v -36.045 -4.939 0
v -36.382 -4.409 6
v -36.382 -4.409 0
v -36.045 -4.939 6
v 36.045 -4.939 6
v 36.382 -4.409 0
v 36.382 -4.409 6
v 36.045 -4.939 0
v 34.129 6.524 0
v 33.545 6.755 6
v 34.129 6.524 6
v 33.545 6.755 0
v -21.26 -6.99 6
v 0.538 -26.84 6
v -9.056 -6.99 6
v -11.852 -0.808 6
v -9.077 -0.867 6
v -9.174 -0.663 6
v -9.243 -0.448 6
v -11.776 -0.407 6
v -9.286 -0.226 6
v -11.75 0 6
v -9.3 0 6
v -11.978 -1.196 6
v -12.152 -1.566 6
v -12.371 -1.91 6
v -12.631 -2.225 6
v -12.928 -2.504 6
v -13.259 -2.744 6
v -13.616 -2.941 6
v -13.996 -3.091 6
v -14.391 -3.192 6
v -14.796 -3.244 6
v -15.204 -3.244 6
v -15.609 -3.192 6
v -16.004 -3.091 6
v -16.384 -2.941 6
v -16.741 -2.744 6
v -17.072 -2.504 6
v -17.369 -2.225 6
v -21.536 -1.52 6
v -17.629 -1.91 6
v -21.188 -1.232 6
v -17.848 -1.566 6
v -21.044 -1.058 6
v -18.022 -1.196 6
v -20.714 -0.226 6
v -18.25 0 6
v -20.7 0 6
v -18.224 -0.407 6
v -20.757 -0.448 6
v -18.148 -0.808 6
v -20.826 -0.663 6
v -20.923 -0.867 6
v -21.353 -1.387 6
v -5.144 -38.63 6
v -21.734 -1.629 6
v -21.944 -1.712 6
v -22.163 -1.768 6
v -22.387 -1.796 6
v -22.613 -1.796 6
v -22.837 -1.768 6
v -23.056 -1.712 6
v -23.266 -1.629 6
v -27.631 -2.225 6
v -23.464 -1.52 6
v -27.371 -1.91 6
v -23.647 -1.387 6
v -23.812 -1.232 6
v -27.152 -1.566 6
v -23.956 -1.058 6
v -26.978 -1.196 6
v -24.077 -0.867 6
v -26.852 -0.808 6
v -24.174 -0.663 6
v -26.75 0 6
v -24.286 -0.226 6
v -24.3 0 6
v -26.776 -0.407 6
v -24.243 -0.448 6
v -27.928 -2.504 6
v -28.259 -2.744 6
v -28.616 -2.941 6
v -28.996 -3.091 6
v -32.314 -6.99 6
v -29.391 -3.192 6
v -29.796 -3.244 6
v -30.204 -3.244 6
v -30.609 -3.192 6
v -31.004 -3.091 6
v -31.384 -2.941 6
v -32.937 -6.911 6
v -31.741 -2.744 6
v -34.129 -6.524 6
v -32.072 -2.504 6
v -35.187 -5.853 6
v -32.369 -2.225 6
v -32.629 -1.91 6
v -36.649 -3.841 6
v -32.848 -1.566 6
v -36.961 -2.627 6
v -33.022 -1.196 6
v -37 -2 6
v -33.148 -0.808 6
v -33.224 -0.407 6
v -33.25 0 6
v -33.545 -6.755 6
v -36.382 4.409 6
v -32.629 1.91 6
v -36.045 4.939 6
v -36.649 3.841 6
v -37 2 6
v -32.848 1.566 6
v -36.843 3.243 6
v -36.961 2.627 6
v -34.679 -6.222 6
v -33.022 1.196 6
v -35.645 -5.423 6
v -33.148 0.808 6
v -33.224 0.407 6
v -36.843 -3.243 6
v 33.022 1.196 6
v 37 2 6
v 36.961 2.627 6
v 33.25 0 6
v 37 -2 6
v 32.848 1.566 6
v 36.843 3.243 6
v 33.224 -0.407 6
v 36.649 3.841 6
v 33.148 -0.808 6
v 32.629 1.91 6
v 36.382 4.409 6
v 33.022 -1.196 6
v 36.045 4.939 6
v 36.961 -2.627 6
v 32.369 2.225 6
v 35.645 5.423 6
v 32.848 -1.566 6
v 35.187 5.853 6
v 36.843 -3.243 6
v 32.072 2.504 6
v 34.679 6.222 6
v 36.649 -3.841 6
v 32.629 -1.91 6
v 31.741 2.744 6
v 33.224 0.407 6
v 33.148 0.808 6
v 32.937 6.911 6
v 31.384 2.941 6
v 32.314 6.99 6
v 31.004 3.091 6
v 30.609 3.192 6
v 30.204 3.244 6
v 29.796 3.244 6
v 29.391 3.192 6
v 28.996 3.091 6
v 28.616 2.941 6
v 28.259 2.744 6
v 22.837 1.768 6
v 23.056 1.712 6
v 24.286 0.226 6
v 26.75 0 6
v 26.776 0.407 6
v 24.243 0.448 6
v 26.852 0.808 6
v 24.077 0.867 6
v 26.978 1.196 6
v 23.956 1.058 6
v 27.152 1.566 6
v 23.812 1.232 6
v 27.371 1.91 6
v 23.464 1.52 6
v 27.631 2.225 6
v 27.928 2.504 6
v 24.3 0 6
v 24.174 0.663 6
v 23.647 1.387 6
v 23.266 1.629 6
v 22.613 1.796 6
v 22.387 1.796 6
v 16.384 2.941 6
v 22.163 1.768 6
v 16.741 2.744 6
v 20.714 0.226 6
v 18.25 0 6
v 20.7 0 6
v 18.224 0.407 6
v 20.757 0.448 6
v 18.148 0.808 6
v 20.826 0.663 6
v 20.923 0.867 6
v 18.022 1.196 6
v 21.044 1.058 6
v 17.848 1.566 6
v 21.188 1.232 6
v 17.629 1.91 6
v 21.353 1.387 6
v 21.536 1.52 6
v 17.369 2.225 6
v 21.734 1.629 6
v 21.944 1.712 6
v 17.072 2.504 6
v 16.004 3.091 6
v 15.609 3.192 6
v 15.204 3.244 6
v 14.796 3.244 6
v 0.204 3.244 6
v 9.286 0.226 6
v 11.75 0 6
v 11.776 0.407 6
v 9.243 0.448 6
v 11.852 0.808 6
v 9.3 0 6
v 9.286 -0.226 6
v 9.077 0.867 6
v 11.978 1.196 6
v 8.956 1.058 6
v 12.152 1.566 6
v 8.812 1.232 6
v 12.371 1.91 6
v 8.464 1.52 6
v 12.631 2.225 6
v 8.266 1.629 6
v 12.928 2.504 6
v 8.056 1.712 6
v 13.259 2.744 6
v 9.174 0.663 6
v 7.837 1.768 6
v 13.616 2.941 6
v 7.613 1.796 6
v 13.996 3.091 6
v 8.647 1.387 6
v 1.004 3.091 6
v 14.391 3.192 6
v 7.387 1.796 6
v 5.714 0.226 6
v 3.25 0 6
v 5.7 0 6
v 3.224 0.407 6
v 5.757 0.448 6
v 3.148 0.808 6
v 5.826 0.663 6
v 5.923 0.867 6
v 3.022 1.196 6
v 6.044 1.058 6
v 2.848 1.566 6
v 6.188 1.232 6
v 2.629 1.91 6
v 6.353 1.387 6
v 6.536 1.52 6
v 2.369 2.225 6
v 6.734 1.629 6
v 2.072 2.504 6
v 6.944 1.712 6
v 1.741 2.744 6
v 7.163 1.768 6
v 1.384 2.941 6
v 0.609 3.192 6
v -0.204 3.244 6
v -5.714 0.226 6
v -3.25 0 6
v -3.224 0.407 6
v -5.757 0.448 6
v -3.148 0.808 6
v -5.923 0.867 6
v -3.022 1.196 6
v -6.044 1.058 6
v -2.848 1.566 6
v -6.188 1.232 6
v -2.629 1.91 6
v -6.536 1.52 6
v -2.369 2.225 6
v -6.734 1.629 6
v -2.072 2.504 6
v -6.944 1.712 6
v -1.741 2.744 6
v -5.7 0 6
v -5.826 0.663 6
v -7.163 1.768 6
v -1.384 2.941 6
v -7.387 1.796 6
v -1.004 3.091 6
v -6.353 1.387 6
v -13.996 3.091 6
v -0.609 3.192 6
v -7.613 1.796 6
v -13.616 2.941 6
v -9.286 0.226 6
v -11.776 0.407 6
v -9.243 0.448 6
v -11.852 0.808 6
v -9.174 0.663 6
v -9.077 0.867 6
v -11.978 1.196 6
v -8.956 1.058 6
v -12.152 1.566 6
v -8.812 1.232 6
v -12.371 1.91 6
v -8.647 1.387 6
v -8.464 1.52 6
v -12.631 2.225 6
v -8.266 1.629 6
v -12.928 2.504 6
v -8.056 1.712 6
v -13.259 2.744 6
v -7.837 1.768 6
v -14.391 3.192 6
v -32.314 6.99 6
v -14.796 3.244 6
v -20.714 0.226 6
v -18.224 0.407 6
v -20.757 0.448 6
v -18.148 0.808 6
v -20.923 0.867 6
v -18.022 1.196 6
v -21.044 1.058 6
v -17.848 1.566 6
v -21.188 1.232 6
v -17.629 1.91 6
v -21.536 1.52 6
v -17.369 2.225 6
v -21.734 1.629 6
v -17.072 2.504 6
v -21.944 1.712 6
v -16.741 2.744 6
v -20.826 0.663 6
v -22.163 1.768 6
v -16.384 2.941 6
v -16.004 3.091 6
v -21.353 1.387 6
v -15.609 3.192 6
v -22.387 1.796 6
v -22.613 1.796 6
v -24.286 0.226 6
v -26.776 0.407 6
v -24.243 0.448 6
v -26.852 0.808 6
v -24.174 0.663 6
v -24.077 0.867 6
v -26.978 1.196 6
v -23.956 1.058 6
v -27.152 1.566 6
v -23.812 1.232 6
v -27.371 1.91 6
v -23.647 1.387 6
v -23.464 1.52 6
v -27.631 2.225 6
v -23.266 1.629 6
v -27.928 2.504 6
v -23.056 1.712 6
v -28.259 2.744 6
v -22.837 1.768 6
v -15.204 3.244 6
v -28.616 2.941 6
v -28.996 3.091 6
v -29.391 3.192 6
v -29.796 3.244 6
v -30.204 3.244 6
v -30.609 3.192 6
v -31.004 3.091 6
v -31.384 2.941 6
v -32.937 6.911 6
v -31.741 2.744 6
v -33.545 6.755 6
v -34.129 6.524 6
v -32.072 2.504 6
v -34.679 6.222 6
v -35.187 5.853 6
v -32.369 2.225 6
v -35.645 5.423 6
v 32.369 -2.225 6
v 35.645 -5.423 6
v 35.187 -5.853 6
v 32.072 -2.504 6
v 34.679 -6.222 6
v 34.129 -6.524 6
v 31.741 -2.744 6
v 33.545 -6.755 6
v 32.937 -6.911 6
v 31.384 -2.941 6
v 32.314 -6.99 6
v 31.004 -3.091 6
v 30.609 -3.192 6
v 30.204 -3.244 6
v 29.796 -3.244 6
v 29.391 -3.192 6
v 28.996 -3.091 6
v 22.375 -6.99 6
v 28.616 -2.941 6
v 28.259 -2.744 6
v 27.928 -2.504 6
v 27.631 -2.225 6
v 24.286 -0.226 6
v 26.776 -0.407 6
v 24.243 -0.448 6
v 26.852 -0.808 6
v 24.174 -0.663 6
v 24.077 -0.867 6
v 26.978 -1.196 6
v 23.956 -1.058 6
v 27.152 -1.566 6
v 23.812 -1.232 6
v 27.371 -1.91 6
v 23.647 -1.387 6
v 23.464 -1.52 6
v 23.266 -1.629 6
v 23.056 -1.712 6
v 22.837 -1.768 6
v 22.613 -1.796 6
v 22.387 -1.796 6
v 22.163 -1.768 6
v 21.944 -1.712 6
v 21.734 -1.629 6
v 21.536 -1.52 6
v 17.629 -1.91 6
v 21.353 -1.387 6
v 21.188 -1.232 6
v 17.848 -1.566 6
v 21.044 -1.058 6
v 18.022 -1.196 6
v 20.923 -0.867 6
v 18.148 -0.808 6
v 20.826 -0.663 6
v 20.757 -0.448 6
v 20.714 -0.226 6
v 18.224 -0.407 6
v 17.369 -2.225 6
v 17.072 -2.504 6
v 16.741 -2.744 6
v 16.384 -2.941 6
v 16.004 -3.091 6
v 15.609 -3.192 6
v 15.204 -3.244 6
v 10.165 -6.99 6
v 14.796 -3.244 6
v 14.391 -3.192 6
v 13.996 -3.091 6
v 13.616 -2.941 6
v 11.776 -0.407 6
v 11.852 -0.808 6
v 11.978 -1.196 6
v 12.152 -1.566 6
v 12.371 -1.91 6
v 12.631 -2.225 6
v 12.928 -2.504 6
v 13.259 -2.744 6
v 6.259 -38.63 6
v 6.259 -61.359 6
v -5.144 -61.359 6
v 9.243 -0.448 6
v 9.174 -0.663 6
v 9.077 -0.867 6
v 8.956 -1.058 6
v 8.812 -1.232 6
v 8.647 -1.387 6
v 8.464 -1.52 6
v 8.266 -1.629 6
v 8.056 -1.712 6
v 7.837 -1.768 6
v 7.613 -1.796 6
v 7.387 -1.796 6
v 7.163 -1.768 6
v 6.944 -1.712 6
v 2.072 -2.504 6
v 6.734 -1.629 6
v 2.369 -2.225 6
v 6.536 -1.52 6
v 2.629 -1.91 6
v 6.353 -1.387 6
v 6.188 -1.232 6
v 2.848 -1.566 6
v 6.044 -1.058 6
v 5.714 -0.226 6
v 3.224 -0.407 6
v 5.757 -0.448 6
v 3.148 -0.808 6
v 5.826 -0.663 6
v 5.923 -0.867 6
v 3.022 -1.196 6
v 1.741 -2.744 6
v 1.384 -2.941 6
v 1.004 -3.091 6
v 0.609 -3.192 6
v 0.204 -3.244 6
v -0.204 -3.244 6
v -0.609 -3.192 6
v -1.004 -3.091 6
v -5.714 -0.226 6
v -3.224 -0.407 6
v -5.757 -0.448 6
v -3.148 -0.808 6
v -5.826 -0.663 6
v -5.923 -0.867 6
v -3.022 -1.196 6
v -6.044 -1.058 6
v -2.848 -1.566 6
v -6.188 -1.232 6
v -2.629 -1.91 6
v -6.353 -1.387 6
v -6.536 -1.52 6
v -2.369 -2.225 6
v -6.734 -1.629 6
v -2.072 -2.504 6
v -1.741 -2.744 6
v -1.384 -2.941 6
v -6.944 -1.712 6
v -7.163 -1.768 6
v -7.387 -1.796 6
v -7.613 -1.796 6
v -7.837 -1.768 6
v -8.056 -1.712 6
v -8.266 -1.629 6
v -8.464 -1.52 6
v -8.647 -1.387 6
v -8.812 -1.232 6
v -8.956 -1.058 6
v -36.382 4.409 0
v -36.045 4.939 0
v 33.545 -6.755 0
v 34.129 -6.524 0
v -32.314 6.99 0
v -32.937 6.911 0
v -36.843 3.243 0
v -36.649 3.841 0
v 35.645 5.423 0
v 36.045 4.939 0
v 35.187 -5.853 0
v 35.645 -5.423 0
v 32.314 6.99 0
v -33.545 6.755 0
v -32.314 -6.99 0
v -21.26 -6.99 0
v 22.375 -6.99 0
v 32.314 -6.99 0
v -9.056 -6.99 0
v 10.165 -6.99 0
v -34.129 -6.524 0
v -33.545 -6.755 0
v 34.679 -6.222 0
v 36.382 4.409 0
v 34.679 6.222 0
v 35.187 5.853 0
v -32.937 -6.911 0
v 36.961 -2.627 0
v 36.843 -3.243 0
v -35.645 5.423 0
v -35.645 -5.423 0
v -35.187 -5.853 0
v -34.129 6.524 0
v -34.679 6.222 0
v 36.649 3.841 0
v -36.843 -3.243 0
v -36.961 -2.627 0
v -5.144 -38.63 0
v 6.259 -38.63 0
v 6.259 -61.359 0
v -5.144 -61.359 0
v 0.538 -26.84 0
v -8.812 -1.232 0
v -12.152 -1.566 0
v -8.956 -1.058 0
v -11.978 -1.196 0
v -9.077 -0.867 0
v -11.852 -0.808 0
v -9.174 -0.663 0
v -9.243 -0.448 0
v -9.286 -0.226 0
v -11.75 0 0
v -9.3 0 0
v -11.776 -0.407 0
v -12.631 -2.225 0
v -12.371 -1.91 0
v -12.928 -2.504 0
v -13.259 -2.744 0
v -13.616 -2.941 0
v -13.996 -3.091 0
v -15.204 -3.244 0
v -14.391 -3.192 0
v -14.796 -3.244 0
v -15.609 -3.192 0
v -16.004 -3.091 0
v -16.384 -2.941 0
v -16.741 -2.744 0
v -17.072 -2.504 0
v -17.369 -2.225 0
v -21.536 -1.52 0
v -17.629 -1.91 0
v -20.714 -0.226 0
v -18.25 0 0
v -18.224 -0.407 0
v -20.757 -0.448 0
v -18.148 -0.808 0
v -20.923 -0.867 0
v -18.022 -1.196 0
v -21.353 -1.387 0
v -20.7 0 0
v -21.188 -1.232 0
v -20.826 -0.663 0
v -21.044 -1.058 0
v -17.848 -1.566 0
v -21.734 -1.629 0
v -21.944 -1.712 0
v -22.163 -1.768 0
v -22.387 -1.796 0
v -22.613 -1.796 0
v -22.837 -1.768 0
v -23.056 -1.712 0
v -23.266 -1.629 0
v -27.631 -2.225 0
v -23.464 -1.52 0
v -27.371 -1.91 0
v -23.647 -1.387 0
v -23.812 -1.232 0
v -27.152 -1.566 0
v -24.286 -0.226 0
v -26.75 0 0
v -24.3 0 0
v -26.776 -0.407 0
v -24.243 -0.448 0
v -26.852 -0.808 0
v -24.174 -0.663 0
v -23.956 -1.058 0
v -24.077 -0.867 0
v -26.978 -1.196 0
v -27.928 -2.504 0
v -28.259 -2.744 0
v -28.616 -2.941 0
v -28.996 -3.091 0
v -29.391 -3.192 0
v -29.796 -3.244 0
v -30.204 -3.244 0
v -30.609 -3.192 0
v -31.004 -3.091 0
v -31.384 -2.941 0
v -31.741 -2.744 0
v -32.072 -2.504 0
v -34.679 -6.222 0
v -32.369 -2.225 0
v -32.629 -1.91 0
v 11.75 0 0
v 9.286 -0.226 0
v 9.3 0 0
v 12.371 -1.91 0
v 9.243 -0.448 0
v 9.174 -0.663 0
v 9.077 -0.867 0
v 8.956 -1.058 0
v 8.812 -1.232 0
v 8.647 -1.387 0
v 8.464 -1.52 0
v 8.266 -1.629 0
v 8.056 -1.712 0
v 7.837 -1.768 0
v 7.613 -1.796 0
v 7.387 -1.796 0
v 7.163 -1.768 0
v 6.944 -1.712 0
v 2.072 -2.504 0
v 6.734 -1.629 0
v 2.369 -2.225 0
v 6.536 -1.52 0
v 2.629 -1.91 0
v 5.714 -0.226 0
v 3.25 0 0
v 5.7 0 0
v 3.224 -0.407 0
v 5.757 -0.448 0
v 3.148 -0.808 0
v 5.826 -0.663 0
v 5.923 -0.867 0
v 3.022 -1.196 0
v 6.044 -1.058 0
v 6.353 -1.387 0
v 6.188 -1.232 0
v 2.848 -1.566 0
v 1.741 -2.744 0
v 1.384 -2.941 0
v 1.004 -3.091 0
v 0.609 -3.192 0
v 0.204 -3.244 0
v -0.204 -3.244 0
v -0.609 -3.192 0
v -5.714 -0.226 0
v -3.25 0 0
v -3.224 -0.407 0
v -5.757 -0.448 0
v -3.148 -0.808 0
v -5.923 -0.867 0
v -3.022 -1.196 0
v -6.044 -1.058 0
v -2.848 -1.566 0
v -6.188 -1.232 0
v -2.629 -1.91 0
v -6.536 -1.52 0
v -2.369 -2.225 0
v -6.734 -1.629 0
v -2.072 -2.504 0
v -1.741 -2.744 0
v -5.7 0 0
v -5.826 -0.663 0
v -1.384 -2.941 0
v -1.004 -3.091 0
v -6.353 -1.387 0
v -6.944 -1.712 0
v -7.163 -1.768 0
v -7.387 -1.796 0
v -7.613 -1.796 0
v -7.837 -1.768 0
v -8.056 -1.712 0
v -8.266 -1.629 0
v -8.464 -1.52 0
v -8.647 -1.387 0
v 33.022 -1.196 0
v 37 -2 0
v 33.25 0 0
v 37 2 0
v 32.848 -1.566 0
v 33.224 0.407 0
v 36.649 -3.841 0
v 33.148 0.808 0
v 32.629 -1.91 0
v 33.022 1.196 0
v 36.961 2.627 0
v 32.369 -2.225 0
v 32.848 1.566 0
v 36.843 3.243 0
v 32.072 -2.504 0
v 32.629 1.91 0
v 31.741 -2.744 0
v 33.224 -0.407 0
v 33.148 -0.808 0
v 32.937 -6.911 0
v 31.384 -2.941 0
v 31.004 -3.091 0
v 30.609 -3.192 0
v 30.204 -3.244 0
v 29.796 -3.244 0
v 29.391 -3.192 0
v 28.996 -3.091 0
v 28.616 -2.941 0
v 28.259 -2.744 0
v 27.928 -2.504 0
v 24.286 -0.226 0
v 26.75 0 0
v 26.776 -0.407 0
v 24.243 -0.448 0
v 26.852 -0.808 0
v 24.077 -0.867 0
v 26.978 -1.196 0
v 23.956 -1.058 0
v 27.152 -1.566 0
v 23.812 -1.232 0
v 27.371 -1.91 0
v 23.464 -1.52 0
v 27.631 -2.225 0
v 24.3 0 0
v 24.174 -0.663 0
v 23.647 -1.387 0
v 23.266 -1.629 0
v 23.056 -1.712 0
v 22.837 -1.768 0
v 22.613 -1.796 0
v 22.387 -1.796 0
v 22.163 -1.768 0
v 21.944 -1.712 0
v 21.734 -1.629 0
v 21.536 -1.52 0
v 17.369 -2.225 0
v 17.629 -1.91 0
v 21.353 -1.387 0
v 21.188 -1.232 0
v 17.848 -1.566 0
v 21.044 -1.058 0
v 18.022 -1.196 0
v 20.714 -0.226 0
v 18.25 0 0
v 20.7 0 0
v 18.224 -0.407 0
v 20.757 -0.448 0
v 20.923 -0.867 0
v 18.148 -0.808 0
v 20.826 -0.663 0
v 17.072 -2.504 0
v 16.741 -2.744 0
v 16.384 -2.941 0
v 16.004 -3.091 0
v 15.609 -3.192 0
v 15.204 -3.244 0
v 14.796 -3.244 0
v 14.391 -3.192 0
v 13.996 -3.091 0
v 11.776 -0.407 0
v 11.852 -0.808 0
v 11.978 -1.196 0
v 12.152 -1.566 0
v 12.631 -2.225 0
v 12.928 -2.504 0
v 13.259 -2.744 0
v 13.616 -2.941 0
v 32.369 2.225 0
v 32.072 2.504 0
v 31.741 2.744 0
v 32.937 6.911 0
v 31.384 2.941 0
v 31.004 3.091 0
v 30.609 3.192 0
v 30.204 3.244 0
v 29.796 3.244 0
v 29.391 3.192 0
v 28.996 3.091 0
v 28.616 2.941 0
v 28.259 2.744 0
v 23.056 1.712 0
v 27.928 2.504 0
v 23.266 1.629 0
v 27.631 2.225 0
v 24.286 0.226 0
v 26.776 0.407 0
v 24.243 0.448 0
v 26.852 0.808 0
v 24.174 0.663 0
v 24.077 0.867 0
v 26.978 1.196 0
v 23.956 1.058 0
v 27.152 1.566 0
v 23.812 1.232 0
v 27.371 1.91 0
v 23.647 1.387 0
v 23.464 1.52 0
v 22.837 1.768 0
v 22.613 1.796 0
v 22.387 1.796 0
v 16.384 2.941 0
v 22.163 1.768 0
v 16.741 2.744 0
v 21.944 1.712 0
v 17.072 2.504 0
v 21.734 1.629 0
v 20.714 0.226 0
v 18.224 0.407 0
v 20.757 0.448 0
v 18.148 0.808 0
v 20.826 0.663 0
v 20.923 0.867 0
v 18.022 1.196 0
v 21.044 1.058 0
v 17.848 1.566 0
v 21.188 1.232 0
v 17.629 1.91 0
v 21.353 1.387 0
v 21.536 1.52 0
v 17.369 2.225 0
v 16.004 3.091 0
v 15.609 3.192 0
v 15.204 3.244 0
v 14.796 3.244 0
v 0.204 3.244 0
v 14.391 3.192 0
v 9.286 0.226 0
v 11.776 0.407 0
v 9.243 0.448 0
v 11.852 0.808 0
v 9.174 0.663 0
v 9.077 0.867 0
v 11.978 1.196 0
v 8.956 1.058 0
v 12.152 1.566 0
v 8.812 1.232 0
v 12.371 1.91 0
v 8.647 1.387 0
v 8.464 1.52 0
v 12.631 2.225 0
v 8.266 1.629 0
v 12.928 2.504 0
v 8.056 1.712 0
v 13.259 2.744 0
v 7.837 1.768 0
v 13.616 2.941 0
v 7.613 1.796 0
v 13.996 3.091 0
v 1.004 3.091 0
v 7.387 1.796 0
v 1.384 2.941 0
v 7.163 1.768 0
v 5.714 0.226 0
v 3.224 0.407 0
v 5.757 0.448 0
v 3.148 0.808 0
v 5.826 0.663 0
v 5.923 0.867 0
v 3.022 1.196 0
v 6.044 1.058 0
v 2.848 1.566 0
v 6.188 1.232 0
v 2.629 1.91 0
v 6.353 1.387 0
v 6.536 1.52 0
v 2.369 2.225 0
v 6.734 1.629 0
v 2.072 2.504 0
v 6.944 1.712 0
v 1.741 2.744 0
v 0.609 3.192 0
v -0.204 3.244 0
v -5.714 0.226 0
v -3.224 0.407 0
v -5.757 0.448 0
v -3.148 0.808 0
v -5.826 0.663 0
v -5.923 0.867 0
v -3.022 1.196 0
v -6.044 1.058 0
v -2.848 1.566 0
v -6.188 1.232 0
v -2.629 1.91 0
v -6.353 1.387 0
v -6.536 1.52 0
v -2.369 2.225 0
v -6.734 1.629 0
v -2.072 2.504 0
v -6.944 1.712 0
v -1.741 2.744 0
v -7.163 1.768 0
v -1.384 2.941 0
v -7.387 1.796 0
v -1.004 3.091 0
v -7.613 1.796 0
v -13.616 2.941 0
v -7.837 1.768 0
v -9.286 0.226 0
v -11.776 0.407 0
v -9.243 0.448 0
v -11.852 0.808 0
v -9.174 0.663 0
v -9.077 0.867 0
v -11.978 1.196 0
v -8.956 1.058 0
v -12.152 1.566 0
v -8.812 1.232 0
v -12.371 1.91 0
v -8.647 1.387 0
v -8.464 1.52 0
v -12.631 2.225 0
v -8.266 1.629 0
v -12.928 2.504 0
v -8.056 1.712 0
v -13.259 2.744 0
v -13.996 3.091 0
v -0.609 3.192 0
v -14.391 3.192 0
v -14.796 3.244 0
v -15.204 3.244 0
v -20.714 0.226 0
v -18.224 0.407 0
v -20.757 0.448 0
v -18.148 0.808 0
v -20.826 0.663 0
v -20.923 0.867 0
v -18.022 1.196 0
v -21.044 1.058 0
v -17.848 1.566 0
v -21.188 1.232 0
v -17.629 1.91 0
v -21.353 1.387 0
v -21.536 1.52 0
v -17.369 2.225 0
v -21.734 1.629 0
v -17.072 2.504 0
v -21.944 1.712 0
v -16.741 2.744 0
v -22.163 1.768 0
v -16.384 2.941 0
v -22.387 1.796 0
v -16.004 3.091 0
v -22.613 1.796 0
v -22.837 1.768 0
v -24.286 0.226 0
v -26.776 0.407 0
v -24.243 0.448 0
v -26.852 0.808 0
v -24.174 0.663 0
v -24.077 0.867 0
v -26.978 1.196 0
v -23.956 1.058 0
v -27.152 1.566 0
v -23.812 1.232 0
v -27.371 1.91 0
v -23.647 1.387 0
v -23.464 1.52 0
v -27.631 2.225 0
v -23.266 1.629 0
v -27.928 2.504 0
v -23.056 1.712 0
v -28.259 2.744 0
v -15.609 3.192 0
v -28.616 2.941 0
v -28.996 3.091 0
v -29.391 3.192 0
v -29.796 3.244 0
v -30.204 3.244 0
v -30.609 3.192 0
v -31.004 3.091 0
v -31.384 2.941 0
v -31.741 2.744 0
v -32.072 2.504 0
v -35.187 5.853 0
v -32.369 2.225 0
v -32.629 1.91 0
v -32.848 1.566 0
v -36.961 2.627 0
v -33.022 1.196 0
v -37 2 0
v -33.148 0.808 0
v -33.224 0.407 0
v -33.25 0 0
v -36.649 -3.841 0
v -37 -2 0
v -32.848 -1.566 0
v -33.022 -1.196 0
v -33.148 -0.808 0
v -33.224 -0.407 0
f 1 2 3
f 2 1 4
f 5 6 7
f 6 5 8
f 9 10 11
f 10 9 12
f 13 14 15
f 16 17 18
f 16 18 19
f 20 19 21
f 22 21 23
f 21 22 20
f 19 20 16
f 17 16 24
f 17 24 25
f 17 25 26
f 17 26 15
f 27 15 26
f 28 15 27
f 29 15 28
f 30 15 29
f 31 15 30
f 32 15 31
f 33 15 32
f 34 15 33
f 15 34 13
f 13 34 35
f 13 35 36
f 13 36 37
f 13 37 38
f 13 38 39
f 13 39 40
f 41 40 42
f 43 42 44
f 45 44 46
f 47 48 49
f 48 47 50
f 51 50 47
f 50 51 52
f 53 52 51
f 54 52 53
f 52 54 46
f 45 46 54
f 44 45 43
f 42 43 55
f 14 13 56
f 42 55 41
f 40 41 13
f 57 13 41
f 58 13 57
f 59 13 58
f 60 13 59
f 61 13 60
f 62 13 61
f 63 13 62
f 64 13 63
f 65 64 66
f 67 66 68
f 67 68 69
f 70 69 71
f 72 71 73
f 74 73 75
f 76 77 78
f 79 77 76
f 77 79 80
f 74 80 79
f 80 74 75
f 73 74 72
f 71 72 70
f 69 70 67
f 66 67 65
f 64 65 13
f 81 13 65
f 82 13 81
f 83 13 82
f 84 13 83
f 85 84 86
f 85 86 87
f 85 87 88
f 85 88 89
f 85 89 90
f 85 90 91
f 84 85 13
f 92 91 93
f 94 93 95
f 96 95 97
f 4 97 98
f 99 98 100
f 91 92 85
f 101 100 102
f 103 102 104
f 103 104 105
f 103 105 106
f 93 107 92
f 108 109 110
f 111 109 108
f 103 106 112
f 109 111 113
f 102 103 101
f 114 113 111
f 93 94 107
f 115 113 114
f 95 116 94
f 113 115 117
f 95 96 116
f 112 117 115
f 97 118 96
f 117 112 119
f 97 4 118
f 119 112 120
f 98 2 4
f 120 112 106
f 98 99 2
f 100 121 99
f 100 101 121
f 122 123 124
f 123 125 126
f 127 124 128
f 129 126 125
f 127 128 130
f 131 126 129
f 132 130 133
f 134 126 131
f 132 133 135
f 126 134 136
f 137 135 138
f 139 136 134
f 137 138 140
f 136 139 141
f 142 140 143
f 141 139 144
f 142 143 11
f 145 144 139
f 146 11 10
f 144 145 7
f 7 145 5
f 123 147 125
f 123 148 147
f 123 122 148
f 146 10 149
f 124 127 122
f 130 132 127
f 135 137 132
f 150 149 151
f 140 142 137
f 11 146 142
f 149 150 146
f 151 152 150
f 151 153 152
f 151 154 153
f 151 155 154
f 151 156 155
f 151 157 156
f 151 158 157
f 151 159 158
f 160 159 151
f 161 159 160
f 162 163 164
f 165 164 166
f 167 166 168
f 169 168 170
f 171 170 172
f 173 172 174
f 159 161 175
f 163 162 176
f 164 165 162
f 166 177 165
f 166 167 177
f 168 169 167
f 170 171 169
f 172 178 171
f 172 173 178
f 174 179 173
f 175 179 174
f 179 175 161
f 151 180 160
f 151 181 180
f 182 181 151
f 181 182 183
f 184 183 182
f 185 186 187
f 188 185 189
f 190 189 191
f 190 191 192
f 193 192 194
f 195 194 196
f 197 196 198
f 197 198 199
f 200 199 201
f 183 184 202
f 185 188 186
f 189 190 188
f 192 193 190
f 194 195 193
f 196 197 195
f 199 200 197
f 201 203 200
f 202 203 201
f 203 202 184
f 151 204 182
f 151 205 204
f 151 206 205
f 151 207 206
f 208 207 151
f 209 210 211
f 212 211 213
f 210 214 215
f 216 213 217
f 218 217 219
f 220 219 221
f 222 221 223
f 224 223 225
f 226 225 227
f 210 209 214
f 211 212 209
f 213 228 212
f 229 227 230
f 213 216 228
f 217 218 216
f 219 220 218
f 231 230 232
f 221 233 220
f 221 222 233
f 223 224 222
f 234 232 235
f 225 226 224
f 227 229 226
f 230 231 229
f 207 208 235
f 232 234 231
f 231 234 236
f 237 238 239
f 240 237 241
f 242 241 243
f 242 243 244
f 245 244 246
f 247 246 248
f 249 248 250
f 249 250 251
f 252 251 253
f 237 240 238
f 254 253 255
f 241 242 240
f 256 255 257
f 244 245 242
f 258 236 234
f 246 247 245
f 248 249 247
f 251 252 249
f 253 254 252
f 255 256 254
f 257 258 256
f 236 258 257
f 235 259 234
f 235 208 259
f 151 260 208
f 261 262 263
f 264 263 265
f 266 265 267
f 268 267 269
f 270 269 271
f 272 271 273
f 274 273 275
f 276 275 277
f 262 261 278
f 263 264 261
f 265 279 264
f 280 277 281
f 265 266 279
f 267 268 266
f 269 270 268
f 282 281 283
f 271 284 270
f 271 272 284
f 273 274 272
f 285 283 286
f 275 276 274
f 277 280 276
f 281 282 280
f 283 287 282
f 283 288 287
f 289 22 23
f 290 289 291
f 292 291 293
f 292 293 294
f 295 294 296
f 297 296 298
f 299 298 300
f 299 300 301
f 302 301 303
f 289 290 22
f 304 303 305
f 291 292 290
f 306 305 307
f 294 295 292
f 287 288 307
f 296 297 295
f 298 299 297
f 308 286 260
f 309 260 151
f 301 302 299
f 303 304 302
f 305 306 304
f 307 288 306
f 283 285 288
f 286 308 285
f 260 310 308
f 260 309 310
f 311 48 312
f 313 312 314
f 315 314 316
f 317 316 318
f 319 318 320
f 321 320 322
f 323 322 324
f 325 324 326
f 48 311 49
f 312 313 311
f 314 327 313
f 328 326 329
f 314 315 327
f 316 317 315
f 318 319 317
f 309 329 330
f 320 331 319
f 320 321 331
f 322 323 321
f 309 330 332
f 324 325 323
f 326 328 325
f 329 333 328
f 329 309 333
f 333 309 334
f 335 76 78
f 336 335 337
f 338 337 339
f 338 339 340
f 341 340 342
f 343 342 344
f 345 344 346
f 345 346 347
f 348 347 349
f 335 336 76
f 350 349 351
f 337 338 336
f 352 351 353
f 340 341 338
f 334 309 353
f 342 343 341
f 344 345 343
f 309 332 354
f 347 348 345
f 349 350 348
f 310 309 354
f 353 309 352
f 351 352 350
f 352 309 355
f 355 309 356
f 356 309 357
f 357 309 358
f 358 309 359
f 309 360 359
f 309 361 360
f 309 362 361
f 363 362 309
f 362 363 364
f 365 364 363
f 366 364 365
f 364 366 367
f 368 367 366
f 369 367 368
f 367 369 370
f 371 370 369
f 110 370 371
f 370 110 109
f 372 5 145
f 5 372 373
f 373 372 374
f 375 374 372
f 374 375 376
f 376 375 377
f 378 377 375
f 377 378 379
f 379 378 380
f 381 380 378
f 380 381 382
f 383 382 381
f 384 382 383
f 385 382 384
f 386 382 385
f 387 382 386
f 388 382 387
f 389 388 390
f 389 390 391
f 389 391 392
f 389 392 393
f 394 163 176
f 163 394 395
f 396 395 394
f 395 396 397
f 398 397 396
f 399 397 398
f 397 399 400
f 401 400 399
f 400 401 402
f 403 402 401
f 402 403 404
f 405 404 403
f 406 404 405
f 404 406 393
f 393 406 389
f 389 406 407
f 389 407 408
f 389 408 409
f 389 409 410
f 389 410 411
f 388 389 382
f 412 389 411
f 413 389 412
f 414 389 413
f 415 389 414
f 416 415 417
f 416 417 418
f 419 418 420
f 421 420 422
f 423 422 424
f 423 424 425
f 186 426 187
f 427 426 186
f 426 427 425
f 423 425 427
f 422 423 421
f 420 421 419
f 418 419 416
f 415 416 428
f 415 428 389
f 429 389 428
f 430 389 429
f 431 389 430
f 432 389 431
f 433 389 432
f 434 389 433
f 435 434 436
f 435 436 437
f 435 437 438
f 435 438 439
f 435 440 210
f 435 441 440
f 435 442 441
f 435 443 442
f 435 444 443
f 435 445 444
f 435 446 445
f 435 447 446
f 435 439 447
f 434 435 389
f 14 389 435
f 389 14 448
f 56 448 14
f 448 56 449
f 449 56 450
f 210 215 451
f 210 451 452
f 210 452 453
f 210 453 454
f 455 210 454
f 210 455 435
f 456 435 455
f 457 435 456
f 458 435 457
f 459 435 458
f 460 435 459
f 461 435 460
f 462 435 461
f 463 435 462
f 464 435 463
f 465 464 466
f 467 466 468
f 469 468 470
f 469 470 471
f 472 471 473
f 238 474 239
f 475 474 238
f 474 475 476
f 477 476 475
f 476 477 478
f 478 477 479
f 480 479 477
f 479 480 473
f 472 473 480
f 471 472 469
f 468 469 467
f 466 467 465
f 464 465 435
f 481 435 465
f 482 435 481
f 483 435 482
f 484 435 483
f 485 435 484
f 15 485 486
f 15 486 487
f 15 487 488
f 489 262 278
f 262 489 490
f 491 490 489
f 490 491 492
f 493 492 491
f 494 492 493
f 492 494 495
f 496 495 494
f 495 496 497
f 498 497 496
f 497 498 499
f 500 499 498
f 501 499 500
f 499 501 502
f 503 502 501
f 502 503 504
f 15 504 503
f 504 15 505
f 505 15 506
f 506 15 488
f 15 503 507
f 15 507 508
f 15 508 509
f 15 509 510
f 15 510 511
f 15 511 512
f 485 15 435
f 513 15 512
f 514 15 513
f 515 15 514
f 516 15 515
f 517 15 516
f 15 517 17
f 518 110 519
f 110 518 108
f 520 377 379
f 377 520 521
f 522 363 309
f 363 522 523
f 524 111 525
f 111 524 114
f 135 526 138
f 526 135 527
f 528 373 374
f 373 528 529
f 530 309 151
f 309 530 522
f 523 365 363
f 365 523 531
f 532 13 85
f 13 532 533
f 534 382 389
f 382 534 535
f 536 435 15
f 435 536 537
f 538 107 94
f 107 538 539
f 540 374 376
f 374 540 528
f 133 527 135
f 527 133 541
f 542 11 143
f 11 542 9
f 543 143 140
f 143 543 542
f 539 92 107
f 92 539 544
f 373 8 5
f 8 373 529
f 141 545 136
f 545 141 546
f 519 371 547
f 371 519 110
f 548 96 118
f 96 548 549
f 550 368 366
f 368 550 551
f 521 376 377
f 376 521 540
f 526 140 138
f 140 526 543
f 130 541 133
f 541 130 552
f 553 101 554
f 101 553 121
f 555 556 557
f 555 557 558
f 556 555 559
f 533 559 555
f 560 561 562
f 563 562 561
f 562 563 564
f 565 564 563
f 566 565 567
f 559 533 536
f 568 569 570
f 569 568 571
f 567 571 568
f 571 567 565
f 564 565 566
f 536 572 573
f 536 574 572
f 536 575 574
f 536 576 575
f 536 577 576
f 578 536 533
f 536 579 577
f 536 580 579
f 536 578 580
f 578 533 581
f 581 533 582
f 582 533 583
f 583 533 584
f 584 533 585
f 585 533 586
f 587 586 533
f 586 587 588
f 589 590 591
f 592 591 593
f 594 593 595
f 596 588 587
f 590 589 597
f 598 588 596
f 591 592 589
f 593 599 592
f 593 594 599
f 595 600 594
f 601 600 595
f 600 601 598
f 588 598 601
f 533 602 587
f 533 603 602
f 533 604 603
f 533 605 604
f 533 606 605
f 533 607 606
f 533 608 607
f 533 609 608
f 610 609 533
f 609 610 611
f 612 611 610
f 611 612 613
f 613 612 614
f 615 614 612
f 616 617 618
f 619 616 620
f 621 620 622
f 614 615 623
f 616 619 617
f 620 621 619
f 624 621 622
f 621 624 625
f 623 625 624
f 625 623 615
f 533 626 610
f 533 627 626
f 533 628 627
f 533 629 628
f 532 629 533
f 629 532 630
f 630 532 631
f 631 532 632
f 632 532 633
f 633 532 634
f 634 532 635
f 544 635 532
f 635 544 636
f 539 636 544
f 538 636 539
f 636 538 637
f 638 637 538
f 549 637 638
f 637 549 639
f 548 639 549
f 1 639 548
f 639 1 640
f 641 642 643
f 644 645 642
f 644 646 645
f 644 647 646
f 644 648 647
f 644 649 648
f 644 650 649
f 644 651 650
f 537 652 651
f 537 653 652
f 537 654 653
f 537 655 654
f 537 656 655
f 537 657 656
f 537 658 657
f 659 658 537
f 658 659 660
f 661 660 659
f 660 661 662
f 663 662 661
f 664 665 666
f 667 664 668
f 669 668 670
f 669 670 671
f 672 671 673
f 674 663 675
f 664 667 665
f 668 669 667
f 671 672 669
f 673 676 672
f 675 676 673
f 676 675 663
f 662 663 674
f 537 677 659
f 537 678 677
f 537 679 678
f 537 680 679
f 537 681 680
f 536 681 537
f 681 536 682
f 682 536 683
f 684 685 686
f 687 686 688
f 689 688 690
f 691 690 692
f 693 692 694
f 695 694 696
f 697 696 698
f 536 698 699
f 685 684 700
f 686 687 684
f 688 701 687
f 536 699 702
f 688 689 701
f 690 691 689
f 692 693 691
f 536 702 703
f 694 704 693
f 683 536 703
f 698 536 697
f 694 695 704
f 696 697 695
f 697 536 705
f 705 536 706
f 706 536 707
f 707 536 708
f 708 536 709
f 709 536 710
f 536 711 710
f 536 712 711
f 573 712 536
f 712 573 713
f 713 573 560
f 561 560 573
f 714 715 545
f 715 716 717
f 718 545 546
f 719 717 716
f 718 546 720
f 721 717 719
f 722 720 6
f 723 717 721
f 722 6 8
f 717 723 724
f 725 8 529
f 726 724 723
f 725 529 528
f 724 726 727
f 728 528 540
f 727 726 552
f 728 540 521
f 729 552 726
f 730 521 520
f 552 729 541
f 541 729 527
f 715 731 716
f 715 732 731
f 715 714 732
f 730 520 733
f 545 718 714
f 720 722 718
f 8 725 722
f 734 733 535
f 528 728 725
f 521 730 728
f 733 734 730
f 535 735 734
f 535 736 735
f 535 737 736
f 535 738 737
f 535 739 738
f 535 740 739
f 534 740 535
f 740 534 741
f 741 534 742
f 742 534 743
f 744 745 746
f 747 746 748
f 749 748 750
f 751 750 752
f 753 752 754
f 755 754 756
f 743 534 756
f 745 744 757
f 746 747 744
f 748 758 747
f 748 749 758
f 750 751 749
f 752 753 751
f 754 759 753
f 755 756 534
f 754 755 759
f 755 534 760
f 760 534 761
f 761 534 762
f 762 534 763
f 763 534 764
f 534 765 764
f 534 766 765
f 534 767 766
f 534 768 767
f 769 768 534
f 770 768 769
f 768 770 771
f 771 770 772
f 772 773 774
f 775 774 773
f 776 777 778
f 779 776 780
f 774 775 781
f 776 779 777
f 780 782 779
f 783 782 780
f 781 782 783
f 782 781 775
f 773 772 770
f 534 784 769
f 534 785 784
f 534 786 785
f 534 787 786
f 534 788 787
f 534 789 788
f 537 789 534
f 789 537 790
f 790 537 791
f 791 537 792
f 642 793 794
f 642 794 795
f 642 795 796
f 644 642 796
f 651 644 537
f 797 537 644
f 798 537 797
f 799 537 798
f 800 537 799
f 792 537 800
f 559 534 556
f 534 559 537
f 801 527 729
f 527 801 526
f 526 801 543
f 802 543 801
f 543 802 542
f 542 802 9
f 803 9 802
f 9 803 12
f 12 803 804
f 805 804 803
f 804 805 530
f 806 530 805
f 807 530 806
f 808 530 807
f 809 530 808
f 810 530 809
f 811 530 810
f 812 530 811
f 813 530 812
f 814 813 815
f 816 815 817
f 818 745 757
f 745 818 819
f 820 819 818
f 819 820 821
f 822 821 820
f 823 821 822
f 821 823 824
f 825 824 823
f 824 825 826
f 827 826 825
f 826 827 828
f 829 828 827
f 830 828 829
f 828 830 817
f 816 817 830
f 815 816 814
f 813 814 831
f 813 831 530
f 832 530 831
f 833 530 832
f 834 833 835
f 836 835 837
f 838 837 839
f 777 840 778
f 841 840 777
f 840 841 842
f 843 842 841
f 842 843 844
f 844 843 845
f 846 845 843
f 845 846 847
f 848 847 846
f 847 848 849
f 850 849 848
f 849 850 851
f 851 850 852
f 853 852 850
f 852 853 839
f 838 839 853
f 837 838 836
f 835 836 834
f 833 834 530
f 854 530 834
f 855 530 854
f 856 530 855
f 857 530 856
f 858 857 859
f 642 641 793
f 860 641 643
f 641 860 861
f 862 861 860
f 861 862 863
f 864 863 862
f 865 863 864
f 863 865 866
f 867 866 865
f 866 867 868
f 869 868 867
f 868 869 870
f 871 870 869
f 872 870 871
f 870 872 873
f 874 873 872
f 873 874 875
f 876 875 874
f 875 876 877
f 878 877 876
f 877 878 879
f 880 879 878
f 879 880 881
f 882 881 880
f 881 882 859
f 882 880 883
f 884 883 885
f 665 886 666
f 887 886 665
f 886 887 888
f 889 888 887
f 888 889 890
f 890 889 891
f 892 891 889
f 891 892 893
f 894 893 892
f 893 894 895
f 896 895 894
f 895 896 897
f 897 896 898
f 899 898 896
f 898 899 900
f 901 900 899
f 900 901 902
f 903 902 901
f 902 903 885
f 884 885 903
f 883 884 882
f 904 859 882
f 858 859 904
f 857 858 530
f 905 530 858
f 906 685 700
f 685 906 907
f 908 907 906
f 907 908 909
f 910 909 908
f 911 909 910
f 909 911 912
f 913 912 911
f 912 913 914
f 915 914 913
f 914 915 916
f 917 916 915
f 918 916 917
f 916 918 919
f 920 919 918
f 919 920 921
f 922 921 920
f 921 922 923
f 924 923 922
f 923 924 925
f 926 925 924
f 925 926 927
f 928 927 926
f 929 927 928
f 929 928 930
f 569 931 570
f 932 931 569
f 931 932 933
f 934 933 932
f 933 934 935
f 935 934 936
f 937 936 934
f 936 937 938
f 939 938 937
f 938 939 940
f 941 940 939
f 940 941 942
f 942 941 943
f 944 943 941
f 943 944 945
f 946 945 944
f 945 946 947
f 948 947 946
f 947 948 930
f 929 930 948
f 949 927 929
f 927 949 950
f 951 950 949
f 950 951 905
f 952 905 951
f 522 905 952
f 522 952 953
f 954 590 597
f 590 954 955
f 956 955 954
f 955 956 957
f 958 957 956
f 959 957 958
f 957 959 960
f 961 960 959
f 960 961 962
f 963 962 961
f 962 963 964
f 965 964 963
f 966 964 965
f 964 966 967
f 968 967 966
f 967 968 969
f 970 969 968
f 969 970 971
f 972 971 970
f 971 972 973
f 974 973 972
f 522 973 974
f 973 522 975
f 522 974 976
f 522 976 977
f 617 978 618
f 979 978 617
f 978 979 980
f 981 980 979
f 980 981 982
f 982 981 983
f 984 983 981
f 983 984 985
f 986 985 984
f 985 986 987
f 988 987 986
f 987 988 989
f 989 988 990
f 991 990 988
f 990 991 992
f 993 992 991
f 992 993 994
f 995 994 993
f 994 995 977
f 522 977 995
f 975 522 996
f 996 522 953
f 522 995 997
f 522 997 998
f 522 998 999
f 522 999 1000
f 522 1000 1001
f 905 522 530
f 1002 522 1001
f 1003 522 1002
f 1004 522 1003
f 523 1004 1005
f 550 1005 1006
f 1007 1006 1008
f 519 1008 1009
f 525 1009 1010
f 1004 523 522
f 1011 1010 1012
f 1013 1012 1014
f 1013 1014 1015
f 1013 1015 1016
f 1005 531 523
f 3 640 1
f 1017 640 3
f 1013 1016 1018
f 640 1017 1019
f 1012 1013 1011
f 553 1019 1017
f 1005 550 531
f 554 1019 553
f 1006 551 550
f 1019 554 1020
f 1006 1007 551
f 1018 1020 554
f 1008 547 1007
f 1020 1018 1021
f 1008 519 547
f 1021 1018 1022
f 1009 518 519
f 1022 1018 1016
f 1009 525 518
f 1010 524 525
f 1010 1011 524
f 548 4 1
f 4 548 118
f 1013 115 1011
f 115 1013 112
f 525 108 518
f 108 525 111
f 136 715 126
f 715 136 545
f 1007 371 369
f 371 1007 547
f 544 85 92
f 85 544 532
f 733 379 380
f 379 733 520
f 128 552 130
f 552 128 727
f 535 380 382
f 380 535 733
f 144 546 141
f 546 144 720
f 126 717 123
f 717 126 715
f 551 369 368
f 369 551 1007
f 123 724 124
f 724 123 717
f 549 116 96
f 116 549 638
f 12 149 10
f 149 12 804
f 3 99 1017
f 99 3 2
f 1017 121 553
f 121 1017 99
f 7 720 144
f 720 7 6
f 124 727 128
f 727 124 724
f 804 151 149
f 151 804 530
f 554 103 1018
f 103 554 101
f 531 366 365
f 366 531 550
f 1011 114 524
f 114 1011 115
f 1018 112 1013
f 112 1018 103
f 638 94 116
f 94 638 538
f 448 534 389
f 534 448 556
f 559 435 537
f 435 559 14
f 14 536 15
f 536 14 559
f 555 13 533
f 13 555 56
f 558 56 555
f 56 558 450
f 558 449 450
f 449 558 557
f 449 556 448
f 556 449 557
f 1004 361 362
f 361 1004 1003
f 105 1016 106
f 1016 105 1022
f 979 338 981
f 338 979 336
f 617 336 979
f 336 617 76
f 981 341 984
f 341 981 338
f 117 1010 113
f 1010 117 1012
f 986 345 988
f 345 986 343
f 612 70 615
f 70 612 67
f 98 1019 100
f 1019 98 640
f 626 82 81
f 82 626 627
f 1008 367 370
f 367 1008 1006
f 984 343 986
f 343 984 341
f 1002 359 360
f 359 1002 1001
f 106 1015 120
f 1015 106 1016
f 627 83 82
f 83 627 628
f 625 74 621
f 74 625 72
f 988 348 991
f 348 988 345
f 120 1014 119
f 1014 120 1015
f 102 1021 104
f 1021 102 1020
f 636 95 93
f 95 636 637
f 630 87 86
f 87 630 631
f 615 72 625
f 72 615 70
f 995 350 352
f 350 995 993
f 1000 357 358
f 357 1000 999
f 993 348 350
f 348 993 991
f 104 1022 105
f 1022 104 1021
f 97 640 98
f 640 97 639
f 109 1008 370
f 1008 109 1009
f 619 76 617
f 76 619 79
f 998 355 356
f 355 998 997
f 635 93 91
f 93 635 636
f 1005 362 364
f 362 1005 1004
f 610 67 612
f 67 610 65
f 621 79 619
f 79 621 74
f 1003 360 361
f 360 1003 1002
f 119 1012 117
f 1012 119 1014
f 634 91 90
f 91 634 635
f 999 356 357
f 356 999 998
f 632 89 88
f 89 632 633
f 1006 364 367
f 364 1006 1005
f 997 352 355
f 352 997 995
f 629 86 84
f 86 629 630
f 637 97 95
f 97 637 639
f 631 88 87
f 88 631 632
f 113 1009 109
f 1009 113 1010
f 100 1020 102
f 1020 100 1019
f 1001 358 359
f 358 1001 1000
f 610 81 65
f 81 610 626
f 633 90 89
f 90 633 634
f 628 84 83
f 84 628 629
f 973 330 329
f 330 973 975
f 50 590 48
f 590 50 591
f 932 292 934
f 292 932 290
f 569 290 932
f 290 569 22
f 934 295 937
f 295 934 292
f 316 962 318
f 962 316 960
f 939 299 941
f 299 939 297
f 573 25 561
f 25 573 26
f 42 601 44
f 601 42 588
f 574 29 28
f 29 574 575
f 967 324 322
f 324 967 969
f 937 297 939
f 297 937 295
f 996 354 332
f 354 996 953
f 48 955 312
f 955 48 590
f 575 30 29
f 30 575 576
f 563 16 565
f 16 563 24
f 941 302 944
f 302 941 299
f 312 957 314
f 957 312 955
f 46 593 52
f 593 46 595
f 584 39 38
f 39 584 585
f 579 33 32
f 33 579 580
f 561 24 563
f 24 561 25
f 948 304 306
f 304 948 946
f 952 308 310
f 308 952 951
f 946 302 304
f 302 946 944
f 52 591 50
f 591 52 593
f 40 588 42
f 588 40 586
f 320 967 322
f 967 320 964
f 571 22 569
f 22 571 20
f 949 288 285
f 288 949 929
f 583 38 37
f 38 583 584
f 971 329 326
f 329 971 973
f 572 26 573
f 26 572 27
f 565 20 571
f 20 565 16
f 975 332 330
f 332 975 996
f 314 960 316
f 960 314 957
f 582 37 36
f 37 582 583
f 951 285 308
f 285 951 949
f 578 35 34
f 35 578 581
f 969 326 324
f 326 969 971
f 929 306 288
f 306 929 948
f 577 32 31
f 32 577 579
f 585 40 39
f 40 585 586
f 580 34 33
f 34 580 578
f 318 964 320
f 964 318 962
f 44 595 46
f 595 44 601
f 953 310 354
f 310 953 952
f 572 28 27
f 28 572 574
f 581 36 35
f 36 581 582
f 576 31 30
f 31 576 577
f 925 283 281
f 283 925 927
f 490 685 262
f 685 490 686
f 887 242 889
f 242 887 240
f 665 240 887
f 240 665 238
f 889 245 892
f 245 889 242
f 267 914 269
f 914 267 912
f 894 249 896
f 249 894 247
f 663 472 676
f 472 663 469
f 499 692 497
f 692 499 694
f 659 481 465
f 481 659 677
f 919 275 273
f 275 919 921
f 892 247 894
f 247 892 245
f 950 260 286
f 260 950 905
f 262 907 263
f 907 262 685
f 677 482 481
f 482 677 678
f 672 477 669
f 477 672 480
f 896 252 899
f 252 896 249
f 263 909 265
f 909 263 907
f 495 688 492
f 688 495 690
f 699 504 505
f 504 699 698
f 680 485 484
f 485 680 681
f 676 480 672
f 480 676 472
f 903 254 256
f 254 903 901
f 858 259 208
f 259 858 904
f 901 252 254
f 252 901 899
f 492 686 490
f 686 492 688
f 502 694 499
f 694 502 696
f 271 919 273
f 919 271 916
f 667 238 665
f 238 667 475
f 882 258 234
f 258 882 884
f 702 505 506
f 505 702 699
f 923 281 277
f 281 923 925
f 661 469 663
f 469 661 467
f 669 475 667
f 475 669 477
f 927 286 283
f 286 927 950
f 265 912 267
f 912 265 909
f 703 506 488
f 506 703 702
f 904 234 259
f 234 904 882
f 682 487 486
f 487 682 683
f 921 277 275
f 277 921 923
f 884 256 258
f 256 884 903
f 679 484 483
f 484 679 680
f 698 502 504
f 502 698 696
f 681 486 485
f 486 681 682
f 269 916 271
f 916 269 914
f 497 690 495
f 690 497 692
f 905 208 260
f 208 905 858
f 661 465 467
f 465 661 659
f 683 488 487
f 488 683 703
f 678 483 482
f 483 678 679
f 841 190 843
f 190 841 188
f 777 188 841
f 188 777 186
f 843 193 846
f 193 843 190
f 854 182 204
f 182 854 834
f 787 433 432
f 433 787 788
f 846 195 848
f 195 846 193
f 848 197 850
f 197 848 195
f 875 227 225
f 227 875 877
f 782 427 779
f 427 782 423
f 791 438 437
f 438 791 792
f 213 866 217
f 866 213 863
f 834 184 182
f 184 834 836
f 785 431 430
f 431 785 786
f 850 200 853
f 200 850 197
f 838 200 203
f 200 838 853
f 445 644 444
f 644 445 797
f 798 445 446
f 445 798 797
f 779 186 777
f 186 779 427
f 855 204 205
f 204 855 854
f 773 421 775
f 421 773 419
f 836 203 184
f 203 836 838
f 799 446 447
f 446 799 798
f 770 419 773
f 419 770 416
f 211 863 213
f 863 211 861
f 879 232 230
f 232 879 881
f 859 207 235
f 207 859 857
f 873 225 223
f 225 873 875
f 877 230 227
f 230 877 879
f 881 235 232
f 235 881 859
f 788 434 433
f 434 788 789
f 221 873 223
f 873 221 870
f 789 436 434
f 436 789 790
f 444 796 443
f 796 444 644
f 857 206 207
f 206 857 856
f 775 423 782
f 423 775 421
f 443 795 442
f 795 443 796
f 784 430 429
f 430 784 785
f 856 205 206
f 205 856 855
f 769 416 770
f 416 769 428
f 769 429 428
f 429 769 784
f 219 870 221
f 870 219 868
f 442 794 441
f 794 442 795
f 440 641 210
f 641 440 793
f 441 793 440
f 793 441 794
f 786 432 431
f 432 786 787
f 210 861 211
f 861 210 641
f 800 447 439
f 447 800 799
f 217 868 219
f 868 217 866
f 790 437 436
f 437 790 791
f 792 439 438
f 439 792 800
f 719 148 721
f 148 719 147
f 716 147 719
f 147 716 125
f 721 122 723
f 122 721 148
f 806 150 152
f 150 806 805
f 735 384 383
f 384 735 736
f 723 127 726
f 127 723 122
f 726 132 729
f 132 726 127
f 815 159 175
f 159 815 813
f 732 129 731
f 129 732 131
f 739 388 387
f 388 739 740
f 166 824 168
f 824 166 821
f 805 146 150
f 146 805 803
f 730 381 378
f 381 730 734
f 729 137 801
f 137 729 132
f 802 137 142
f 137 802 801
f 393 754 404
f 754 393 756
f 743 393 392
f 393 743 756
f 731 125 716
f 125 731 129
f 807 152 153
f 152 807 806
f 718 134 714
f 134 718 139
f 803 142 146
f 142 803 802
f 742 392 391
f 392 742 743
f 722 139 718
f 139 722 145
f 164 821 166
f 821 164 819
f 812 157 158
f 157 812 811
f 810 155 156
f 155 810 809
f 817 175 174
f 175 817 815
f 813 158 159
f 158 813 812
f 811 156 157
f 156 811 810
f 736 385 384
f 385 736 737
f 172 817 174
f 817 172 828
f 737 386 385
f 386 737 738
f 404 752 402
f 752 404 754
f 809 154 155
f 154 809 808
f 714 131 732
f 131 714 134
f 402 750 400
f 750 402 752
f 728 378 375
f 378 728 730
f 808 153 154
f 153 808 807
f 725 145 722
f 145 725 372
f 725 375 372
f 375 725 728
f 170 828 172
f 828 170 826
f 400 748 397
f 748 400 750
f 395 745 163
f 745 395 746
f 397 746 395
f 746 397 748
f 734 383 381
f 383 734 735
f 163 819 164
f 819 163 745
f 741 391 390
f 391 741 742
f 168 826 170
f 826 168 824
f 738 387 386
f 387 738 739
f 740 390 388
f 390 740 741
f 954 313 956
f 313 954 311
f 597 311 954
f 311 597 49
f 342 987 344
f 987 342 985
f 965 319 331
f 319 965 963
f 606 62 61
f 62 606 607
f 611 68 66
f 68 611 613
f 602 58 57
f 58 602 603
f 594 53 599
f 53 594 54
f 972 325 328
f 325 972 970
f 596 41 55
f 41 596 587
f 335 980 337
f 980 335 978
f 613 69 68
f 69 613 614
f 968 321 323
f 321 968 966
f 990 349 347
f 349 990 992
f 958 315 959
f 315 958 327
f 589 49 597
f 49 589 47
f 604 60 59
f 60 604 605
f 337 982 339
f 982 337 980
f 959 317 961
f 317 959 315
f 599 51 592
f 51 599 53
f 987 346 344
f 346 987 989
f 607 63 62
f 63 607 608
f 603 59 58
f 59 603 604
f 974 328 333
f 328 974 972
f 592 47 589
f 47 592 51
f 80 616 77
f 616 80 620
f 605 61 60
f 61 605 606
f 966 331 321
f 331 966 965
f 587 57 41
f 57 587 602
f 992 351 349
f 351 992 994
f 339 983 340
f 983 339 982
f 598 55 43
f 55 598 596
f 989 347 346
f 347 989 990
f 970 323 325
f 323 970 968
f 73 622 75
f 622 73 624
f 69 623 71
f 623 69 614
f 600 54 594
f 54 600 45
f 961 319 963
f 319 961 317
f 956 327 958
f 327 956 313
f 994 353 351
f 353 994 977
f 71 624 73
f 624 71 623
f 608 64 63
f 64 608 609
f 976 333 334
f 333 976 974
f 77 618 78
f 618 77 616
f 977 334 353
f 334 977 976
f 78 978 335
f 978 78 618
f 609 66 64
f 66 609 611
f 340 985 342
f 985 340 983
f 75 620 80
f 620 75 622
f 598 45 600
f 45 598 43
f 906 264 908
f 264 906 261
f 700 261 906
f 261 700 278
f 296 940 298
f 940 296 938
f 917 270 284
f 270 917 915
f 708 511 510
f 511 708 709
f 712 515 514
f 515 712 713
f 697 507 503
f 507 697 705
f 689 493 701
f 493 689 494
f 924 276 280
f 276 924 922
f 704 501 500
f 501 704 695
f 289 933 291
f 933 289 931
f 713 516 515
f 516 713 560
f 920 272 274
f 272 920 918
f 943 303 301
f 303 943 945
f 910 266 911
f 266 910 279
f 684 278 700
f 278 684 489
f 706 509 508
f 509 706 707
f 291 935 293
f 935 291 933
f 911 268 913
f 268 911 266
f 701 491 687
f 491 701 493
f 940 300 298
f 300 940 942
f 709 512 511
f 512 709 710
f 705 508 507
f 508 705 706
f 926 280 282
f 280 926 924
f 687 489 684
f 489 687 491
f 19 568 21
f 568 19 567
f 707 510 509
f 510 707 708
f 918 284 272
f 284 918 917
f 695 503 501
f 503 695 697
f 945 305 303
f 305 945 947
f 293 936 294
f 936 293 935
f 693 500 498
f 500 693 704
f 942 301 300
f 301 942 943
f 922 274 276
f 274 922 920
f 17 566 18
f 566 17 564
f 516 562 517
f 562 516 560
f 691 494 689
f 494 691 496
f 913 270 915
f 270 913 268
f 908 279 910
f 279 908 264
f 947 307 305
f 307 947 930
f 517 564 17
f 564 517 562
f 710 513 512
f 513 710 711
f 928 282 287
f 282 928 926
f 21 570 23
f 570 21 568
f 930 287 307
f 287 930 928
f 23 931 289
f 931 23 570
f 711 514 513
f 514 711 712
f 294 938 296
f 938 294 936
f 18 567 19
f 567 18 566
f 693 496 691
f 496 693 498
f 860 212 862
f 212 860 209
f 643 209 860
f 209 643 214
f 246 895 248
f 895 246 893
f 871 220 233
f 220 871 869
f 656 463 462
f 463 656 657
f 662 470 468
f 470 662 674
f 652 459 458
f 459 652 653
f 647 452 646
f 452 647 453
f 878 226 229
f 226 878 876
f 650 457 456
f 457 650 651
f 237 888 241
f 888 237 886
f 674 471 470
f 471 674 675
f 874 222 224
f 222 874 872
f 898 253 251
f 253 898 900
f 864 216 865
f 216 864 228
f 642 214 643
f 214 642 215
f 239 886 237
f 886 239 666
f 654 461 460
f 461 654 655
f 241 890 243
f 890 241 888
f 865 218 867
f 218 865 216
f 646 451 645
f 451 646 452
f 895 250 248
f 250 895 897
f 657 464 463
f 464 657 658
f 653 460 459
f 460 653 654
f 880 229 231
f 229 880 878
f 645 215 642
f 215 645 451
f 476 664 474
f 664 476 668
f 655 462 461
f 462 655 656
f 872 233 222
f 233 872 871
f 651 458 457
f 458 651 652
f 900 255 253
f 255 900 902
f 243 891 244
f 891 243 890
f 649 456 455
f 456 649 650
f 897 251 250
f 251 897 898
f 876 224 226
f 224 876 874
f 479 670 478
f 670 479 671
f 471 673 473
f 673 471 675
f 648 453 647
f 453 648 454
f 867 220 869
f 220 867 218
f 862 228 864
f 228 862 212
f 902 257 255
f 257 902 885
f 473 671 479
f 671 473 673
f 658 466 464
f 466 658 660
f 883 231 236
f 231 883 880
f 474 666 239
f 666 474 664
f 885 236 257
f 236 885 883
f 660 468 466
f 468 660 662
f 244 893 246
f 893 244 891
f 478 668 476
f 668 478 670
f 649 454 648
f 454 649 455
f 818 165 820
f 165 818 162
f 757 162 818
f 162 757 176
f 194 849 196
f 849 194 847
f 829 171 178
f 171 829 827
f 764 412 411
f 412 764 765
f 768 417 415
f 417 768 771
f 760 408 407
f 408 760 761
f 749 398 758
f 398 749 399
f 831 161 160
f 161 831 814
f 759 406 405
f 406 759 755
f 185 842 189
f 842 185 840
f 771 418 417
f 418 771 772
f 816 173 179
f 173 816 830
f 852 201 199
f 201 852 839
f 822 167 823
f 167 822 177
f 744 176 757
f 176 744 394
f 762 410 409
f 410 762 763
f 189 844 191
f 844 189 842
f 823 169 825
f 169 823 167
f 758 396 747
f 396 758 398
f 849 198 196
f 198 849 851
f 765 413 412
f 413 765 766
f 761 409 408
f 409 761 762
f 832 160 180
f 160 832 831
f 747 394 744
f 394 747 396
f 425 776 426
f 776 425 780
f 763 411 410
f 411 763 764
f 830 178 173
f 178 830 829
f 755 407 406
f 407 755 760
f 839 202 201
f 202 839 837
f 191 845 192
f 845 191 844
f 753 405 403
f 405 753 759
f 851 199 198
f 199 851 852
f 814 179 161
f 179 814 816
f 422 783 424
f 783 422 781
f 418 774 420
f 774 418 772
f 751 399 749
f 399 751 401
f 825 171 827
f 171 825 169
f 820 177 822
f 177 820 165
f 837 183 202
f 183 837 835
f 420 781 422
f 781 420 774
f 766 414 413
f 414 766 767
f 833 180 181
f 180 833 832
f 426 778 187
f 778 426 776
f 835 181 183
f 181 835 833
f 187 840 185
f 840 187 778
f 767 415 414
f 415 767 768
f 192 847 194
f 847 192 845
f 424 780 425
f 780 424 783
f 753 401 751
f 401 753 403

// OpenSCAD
$fn = 50;


difference() {
	union() {
		hull() {
			translate(v = [-32.0000000000, 2.0000000000, 0]) {
				cylinder(h = 6, r = 5);
			}
			translate(v = [32.0000000000, 2.0000000000, 0]) {
				cylinder(h = 6, r = 5);
			}
			translate(v = [-32.0000000000, -2.0000000000, 0]) {
				cylinder(h = 6, r = 5);
			}
			translate(v = [32.0000000000, -2.0000000000, 0]) {
				cylinder(h = 6, r = 5);
			}
		}
		translate(v = [0, -5, 0]) {
			linear_extrude(height = 6) {
				text(font = "DejaVu Sans Mono:style=Bold", halign = "center", size = 57.0000000000, text = "Y", valign = "top");
			}
		}
	}
	union() {
		translate(v = [-30.0000000000, 0.0000000000, 0]) {
			translate(v = [0, 0, -100]) {
				cylinder(h = 200, r = 3.2500000000);
			}
		}
		translate(v = [-15.0000000000, 0.0000000000, 0]) {
			translate(v = [0, 0, -100]) {
				cylinder(h = 200, r = 3.2500000000);
			}
		}
		translate(v = [0, 0, -100]) {
			cylinder(h = 200, r = 3.2500000000);
		}
		translate(v = [15.0000000000, 0.0000000000, 0]) {
			translate(v = [0, 0, -100]) {
				cylinder(h = 200, r = 3.2500000000);
			}
		}
		translate(v = [30.0000000000, 0.0000000000, 0]) {
			translate(v = [0, 0, -100]) {
				cylinder(h = 200, r = 3.2500000000);
			}
		}
		translate(v = [-30.0000000000, 0.0000000000, 0]) {
			translate(v = [0, 0, -100]) {
				cylinder(h = 200, r = 1.8000000000);
			}
		}
		translate(v = [-22.5000000000, 0.0000000000, 0]) {
			translate(v = [0, 0, -100]) {
				cylinder(h = 200, r = 1.8000000000);
			}
		}
		translate(v = [-15.0000000000, 0.0000000000, 0]) {
			translate(v = [0, 0, -100]) {
				cylinder(h = 200, r = 1.8000000000);
			}
		}
		translate(v = [-7.5000000000, 0.0000000000, 0]) {
			translate(v = [0, 0, -100]) {
				cylinder(h = 200, r = 1.8000000000);
			}
		}
		translate(v = [0, 0, -100]) {
			cylinder(h = 200, r = 1.8000000000);
		}
		translate(v = [7.5000000000, 0.0000000000, 0]) {
			translate(v = [0, 0, -100]) {
				cylinder(h = 200, r = 1.8000000000);
			}
		}
		translate(v = [15.0000000000, 0.0000000000, 0]) {
			translate(v = [0, 0, -100]) {
				cylinder(h = 200, r = 1.8000000000);
			}
		}
		translate(v = [22.5000000000, 0.0000000000, 0]) {
			translate(v = [0, 0, -100]) {
				cylinder(h = 200, r = 1.8000000000);
			}
		}
		translate(v = [30.0000000000, 0.0000000000, 0]) {
			translate(v = [0, 0, -100]) {
				cylinder(h = 200, r = 1.8000000000);
			}
		}
	}
}
